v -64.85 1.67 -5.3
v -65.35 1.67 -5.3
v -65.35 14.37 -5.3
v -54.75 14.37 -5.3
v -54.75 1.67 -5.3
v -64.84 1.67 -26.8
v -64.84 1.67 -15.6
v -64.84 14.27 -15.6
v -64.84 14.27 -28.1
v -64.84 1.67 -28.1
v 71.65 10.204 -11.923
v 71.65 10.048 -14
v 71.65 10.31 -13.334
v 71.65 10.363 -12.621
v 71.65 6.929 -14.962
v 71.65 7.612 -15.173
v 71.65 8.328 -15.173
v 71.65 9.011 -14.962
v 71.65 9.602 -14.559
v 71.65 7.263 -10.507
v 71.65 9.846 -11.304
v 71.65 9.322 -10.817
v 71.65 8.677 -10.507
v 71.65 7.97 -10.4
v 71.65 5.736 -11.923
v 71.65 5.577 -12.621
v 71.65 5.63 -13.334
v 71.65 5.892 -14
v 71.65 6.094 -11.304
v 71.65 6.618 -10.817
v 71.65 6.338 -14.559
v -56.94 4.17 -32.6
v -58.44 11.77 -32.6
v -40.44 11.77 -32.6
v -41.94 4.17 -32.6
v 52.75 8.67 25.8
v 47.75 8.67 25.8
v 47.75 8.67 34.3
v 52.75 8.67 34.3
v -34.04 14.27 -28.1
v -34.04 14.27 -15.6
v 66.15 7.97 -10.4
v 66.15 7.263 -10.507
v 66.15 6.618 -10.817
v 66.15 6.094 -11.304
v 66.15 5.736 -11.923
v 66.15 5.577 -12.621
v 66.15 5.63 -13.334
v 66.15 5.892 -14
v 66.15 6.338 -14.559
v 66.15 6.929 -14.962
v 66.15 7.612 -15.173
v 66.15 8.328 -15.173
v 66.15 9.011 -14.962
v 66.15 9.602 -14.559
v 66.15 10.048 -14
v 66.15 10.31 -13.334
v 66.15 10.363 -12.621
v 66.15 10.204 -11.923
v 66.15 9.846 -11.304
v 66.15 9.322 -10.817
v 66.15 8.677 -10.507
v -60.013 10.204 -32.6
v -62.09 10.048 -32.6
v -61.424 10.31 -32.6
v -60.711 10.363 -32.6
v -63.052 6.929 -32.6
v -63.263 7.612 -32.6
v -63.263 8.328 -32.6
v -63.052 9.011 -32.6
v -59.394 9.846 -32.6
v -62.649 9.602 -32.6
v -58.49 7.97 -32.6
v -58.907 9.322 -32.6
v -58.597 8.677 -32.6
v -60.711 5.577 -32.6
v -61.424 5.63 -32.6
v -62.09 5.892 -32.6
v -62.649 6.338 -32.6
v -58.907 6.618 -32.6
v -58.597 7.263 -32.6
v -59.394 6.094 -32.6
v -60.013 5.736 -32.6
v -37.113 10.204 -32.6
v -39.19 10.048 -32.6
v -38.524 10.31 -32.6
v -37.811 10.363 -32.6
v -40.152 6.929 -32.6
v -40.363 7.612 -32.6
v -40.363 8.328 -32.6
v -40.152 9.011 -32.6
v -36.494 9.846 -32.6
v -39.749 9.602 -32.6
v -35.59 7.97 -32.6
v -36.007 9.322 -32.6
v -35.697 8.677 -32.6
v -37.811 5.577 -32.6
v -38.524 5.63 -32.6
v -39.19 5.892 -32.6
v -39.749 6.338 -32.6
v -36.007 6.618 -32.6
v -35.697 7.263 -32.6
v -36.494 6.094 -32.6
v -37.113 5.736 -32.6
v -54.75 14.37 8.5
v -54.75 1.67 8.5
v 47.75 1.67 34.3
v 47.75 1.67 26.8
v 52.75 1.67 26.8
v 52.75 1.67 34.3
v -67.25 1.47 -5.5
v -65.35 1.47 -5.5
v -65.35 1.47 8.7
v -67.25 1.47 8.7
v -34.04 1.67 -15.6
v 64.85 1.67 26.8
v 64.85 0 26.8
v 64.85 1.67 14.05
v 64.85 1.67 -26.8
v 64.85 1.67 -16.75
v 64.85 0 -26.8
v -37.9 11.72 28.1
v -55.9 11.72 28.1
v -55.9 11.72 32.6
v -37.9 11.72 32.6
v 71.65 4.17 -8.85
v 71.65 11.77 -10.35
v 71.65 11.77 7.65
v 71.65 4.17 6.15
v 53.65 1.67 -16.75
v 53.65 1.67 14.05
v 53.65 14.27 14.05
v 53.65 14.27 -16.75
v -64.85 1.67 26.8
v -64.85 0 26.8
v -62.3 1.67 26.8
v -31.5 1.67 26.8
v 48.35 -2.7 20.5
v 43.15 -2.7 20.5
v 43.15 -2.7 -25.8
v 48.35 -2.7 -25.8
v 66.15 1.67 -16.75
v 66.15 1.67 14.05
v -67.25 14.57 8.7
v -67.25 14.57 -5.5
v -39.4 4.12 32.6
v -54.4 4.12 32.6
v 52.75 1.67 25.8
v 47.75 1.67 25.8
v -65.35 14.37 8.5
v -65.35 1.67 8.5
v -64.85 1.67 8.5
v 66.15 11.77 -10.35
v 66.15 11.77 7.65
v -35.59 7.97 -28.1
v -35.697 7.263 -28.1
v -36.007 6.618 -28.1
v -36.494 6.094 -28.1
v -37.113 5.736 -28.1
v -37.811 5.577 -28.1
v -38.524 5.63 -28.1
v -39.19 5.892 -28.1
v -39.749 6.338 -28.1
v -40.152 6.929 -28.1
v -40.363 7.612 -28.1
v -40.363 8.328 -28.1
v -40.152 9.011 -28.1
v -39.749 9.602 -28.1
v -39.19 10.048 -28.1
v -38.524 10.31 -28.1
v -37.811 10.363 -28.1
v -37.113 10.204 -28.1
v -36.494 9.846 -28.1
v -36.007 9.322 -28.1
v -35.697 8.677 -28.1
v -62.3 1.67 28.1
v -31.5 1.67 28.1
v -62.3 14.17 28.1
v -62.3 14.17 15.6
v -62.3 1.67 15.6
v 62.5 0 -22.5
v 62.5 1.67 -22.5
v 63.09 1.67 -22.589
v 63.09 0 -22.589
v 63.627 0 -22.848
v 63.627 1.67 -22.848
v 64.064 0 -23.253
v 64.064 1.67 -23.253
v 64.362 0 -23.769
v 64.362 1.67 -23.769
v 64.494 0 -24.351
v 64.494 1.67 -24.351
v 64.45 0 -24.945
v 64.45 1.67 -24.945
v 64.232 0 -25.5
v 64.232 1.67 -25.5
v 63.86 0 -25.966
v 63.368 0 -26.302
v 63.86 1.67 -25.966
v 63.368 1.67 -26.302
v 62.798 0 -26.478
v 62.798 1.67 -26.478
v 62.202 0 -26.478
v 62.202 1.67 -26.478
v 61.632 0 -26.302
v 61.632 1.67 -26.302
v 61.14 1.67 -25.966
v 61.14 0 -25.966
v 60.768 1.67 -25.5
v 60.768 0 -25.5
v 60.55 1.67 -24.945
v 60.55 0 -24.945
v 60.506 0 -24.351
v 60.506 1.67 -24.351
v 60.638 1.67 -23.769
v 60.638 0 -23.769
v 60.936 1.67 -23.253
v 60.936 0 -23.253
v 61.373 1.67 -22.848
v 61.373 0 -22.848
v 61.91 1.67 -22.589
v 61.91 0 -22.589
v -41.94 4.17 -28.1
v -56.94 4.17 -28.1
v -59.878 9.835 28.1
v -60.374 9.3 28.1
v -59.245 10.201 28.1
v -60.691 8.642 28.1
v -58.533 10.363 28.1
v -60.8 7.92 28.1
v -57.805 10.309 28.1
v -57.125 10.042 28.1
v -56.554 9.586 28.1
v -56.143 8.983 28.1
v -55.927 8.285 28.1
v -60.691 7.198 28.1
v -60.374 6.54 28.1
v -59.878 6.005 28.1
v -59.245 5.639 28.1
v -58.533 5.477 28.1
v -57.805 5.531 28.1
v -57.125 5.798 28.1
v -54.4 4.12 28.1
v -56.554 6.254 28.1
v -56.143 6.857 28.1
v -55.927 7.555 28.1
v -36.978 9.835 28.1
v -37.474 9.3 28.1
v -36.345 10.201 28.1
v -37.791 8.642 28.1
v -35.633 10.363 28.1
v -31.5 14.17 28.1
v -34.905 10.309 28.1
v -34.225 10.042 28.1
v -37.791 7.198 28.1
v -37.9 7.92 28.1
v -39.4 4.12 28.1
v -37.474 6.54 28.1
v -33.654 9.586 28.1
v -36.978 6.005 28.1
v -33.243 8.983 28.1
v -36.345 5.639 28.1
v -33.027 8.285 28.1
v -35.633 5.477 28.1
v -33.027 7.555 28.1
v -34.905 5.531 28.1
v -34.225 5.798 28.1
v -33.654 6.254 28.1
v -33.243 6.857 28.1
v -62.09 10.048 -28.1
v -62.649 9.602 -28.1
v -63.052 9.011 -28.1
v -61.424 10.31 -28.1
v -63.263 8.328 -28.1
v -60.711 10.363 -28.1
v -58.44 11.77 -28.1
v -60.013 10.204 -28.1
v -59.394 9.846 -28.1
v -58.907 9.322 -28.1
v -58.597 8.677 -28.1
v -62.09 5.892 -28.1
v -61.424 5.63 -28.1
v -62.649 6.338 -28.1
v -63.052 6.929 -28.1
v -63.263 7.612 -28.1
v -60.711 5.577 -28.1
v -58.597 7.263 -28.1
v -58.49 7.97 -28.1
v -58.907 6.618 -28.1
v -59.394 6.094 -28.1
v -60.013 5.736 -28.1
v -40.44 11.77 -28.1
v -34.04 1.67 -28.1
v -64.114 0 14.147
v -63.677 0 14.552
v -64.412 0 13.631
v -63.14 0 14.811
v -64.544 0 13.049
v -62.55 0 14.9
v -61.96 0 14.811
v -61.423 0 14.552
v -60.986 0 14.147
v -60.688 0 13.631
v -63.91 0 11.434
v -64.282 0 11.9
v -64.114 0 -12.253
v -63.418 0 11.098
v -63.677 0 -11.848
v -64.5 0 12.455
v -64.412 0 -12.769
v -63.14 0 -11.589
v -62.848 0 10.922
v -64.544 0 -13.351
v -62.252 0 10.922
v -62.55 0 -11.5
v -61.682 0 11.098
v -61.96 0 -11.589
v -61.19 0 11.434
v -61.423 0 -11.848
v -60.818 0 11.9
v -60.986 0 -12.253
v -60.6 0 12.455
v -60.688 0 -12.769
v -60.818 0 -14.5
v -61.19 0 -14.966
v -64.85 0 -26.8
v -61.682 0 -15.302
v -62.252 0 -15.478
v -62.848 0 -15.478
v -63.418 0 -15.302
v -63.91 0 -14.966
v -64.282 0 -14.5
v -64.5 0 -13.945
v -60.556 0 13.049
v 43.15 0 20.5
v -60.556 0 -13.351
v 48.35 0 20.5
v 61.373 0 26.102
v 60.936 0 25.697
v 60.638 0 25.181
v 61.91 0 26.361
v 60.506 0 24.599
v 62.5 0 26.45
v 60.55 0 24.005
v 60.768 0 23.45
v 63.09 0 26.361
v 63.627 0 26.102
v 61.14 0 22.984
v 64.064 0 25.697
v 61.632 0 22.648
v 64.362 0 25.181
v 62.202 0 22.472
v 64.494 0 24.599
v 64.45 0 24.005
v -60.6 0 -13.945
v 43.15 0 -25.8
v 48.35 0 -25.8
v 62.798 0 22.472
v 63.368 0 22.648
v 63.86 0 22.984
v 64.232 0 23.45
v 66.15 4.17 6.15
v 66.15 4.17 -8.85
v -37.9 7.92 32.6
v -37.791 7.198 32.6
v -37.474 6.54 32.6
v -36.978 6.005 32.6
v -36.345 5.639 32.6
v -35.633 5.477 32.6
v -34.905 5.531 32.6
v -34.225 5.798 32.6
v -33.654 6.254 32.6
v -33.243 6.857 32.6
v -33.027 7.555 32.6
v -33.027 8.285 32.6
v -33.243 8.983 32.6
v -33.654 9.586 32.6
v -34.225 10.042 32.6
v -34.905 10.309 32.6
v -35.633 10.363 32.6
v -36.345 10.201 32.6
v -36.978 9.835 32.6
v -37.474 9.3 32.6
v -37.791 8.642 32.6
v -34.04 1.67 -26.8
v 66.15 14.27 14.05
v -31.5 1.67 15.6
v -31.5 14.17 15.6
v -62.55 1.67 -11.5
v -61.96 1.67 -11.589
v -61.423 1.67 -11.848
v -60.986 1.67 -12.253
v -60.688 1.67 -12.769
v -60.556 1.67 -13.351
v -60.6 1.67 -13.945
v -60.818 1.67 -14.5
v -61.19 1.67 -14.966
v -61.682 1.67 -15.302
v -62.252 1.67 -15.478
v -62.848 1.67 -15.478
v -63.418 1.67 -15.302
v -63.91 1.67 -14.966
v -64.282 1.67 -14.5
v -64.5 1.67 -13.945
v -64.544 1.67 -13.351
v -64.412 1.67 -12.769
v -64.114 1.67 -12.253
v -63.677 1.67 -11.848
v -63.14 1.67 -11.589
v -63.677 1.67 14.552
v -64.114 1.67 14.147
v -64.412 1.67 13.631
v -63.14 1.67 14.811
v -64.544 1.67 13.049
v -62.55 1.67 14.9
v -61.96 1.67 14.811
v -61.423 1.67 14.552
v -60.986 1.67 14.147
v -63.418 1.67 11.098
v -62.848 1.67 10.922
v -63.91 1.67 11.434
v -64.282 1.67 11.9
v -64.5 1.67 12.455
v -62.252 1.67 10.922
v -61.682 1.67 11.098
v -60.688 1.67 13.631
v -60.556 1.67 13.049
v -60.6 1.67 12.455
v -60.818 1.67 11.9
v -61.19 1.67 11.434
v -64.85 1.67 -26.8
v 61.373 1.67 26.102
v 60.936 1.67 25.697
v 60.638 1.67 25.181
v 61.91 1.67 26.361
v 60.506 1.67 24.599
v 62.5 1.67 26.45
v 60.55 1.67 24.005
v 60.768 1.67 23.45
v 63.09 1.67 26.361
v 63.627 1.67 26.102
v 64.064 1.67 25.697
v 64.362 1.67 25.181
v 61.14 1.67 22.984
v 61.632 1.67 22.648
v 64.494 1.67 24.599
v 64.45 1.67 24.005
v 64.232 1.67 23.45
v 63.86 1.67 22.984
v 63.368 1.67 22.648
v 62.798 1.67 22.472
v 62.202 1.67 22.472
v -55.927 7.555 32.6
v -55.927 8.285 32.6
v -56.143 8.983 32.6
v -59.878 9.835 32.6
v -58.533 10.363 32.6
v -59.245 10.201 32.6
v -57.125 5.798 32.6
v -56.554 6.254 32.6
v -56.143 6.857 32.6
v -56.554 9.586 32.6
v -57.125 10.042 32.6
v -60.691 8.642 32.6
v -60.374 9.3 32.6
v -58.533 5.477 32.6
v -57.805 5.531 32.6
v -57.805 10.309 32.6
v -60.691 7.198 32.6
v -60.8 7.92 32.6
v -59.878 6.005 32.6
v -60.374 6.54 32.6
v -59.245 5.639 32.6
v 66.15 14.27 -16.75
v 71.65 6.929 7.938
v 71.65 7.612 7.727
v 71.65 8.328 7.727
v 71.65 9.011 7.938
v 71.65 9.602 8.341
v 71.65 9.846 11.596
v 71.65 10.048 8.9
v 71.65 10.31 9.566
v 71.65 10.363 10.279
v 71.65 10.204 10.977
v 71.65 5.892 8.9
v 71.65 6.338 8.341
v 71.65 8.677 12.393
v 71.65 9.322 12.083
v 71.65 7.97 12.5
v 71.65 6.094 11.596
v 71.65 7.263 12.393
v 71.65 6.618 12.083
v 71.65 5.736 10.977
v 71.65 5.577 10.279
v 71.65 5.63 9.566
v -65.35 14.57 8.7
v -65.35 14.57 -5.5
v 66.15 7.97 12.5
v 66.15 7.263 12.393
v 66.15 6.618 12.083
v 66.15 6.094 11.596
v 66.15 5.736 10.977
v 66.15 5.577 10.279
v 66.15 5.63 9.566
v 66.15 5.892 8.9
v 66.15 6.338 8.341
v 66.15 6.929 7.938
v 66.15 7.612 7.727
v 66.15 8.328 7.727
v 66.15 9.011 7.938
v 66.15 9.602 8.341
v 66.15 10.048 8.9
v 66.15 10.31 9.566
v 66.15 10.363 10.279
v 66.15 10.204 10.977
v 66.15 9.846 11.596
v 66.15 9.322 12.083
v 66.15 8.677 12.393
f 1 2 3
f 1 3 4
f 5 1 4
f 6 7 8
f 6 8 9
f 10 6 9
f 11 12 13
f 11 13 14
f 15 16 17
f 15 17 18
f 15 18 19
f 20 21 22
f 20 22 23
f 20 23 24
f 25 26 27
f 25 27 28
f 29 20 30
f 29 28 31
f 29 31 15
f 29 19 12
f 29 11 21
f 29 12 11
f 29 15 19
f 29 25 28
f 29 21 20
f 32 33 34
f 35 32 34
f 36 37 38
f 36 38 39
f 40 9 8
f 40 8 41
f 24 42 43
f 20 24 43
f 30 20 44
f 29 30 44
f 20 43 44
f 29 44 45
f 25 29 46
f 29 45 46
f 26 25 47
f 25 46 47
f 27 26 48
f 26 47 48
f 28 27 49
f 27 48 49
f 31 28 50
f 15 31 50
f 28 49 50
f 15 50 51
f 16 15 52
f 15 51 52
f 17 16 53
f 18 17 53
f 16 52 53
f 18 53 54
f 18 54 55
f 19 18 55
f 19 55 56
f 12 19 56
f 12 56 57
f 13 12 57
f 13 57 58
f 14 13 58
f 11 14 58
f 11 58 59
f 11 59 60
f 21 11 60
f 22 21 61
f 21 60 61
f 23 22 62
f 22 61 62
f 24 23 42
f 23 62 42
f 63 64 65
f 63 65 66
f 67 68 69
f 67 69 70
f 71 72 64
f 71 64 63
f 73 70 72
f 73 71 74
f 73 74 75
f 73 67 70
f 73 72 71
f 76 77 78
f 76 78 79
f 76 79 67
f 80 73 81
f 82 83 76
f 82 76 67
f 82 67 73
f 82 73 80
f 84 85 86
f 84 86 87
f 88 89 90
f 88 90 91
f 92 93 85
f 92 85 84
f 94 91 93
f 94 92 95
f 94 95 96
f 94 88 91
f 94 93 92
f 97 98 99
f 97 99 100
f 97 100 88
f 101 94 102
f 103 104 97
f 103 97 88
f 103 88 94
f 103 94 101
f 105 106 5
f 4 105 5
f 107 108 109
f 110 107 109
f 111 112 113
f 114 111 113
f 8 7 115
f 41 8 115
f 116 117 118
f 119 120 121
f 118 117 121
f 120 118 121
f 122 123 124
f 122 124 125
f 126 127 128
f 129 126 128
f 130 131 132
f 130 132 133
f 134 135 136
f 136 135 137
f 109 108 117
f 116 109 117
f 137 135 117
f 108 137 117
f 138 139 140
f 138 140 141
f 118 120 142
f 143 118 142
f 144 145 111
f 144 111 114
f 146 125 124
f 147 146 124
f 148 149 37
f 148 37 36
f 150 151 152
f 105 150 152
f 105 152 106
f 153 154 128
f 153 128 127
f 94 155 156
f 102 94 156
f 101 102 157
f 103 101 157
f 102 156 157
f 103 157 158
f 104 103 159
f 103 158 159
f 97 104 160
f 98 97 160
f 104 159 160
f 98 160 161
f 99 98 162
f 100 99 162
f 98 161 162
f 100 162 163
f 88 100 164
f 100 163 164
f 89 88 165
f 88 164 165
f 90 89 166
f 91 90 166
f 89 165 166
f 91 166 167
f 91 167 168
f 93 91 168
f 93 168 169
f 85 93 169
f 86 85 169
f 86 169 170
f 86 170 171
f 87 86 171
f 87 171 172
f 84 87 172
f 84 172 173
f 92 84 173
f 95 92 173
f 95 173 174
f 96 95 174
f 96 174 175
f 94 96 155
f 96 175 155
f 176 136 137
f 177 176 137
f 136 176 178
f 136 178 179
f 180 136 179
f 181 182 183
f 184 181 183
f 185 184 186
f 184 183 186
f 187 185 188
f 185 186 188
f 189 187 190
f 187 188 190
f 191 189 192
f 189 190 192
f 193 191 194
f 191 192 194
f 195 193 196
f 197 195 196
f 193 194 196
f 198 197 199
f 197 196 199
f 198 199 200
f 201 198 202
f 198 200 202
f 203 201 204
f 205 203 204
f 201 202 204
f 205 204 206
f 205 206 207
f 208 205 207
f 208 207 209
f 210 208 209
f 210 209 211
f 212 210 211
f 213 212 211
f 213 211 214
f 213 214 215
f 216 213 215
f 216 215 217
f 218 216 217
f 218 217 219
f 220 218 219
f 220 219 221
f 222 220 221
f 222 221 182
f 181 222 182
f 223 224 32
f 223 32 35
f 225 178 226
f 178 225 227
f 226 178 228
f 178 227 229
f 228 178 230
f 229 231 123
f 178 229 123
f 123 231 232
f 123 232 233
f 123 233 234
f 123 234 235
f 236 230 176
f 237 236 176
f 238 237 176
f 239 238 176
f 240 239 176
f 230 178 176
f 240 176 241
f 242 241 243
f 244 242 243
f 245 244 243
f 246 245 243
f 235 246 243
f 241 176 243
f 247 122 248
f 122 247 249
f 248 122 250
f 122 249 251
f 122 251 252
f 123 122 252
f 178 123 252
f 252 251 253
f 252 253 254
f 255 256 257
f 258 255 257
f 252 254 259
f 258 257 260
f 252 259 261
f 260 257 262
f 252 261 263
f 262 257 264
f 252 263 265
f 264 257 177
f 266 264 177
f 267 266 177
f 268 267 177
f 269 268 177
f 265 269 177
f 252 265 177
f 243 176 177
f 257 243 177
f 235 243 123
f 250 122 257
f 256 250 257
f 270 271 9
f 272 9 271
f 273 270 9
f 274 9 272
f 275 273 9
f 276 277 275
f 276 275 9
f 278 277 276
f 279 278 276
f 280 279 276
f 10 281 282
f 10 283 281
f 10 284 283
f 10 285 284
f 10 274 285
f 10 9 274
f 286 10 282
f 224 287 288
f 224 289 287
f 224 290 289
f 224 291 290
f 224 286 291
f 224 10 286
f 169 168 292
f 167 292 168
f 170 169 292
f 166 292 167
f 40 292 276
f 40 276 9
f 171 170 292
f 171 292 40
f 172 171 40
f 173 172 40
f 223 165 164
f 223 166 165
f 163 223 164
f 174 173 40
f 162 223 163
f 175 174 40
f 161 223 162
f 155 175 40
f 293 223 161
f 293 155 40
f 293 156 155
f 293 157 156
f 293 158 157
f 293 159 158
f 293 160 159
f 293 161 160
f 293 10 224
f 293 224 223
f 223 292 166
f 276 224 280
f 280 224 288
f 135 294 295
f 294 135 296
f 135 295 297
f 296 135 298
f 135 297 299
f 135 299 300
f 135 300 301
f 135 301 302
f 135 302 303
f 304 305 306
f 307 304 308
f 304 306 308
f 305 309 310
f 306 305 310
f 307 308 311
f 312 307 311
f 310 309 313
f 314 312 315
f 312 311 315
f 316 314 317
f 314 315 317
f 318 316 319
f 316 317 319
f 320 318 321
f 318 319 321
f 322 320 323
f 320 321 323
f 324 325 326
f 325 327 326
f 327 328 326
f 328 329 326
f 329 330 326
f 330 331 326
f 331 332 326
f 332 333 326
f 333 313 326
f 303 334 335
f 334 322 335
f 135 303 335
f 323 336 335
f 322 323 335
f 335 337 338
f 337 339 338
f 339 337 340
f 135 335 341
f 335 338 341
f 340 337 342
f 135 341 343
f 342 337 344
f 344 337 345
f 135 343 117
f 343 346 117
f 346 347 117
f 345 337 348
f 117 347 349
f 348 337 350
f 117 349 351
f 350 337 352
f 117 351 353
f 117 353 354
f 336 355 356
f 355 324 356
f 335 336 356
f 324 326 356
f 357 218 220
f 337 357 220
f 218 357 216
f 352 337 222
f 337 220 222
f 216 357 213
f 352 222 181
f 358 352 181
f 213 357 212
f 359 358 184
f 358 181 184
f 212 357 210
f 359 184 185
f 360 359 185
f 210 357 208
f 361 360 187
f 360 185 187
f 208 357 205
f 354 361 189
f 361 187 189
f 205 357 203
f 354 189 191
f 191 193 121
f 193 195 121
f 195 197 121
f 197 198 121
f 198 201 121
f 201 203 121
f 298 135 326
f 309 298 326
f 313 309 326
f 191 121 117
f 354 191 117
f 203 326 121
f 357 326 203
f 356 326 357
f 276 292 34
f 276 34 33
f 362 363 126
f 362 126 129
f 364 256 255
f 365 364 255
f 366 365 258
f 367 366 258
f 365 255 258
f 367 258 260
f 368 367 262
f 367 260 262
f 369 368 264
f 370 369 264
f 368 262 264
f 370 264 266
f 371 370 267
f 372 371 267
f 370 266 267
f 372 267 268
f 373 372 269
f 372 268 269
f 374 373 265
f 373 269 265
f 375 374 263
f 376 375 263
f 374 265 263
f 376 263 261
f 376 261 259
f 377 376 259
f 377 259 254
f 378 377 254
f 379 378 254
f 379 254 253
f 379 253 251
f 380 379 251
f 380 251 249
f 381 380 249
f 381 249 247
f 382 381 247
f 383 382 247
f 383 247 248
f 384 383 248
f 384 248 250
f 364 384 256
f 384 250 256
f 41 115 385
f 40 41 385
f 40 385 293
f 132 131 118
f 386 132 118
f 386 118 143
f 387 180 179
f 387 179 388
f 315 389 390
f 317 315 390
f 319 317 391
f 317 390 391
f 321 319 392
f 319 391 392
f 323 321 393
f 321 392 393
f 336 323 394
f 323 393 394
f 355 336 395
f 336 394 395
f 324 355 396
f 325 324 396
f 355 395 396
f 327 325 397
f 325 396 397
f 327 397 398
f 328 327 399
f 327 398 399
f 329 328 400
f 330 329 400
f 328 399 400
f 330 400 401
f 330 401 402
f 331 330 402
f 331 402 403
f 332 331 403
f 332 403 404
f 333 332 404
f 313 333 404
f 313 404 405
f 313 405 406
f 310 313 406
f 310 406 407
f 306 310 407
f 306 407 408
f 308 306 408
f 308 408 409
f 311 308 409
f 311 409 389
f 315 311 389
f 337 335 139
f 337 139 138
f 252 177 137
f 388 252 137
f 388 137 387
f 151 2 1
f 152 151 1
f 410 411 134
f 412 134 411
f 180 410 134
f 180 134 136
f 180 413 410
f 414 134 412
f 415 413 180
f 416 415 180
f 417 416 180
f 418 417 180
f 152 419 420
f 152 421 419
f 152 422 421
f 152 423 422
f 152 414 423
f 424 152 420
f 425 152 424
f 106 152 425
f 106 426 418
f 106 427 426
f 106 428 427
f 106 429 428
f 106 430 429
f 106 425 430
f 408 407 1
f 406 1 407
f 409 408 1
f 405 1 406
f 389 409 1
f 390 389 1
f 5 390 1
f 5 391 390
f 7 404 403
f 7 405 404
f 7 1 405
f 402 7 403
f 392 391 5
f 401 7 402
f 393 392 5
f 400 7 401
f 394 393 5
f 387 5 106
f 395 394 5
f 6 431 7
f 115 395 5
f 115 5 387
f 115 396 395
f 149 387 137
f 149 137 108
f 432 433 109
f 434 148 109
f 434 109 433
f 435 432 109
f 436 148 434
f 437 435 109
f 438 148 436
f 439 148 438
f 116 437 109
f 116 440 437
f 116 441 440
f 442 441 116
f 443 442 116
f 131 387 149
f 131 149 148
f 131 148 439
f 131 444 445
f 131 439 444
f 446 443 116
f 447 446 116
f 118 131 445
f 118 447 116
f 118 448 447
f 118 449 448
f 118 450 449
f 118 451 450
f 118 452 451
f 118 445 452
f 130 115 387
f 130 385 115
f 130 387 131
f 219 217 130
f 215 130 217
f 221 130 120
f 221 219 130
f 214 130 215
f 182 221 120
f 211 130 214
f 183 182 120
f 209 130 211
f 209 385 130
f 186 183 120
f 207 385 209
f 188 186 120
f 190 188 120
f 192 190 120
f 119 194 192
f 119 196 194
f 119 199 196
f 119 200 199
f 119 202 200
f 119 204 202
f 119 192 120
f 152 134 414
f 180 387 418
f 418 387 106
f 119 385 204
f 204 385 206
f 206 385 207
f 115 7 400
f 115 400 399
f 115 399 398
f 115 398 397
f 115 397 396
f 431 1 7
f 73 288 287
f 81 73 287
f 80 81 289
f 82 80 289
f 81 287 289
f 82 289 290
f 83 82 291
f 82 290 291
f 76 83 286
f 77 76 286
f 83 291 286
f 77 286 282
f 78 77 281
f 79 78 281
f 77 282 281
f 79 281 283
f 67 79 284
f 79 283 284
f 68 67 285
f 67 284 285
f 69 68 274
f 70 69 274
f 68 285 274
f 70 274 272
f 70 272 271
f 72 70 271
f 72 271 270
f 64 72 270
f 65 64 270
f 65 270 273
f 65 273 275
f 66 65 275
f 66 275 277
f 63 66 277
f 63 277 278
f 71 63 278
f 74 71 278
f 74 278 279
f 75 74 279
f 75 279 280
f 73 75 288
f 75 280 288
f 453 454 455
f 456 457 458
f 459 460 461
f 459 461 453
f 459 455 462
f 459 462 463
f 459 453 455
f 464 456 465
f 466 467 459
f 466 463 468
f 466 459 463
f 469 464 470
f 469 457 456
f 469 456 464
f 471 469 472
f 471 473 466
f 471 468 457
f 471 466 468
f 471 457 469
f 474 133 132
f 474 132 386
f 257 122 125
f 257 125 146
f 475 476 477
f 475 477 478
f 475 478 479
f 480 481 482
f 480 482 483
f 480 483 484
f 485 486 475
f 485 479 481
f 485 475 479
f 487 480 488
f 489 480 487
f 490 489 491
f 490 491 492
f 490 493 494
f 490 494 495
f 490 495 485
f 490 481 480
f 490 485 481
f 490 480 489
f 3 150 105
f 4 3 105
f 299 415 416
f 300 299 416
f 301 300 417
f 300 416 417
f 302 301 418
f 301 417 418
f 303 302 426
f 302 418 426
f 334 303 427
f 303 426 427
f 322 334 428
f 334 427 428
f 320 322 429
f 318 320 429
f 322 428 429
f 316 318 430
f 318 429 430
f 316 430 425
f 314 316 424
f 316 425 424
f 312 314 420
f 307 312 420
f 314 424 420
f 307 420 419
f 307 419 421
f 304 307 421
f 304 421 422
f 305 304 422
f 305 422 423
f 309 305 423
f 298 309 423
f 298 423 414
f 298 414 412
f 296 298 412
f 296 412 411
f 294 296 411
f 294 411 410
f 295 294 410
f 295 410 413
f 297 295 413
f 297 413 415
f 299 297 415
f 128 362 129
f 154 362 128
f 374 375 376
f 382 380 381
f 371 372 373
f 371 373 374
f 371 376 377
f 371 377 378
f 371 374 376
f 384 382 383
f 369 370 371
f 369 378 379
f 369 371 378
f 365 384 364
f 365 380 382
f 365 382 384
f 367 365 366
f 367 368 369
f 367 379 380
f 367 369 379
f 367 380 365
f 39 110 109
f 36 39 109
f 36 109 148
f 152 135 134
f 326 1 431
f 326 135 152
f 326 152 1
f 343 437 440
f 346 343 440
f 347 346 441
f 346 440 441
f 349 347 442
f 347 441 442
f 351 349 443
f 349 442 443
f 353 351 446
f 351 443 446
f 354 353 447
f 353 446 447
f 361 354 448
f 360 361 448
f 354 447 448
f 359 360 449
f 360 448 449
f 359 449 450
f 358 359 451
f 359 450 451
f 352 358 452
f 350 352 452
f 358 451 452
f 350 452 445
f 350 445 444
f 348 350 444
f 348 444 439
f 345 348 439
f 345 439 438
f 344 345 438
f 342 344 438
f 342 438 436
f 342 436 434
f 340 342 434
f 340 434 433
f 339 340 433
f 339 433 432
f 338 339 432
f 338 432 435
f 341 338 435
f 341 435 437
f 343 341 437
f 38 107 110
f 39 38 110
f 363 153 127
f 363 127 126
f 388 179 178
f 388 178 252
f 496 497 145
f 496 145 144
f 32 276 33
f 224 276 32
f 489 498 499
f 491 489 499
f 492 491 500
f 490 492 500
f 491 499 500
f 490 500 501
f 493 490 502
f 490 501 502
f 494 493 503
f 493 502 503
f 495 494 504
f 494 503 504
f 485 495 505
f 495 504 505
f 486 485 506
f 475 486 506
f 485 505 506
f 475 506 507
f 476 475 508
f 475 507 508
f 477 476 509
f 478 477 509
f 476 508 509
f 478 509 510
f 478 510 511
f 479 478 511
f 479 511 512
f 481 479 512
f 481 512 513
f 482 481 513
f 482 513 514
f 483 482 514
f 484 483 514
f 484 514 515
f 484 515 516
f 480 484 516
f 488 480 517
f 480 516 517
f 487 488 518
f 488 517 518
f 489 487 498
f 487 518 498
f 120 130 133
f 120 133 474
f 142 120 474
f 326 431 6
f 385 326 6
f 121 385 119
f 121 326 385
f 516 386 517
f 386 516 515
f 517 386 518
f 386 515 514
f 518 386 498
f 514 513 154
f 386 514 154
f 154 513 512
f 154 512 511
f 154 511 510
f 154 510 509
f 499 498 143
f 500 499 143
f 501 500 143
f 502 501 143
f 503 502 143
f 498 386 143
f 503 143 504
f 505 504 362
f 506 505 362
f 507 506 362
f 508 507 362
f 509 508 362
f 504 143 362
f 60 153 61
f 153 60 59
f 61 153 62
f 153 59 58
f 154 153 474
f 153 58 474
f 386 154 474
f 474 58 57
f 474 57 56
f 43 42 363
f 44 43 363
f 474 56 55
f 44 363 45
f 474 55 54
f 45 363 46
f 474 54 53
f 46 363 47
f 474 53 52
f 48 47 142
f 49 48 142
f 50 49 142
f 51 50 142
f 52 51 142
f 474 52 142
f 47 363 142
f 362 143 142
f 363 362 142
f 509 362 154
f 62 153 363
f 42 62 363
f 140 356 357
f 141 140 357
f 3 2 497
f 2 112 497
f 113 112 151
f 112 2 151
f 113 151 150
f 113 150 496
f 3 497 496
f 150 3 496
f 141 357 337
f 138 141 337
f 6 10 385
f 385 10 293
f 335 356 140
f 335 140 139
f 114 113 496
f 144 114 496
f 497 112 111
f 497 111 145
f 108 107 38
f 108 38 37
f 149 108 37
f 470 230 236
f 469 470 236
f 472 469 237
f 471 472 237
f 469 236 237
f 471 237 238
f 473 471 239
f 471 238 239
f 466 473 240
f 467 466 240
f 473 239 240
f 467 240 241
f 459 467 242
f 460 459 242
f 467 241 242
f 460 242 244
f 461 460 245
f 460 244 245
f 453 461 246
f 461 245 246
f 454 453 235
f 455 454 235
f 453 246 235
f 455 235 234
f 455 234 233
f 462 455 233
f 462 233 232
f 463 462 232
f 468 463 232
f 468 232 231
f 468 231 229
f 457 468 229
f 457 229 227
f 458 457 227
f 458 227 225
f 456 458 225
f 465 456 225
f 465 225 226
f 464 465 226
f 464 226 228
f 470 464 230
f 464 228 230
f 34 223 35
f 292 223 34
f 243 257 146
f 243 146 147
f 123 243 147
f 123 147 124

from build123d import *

# Parameters (mm, degrees)
SKETCH1_W           = 129.7
SKETCH1_H           = 53.6
BOARDBASE_DEPTH     = 1.67
SKETCH3_W           = 12.5
SKETCH3_H           = 30.8
BOSS_EXTRUDE2_DEPTH = 12.6
SKETCH4_R           = 2.4
BOSS_EXTRUDE3_DEPTH = 5.5
SKETCH6_W           = 30.8
SKETCH6_H           = 12.5
BOSS_EXTRUDE5_DEPTH = 12.5
SKETCH7_R           = 2.45
BOSS_EXTRUDE6_DEPTH = 4.5
SKETCH5_W           = 30.8
SKETCH5_H           = 12.5
BOSS_EXTRUDE4_DEPTH = 12.6
SKETCH9_R           = 2.4
BOSS_EXTRUDE7_DEPTH = 4.5
SKETCH10_W          = 10.6
SKETCH10_H          = 13.8
BOSS_EXTRUDE8_DEPTH = 12.7
SKETCH12_W          = 14.2
SKETCH12_H          = 13.1
BOSS_EXTRUDE9_DEPTH = 1.9
SKETCH13_W          = 5.2
SKETCH13_H          = 46.3
MOLEXHEADER_DEPTH   = 2.7
SKETCH14_R          = 2
MOUNTHOLES_DEPTH    = 80.767740973
SKETCH15_W          = 5
SKETCH15_H          = 8.5
STIMHEADER_DEPTH    = 7


with BuildPart() as part:
    # Sketch1 → BoardBase (new body)
    with BuildSketch(Plane(origin=(0, 0, 0), x_dir=(1, 0, 0), z_dir=(0, 1, 0))):
        Rectangle(SKETCH1_W, SKETCH1_H)
    extrude(amount=BOARDBASE_DEPTH)

    # Sketch3 → Boss-Extrude2 (add)
    with BuildSketch(Plane(origin=(0, 1.67, 0), x_dir=(1, 0, 0), z_dir=(0, 1, 0))):
        with Locations((59.9, 1.35)):
            Rectangle(SKETCH3_W, SKETCH3_H)
    extrude(amount=BOSS_EXTRUDE2_DEPTH)

    # Sketch4 → Boss-Extrude3 (add)
    with BuildSketch(Plane(origin=(66.15, 0, 0), x_dir=(0, 0, -1), z_dir=(1, 0, 0))):
        with Locations(Location((-10.1, 7.97, 0), (0, 0, 180))):
            Circle(SKETCH4_R)
        with Locations(Location((12.8, 7.97, 0), (0, 0, 180))):
            Circle(SKETCH4_R)
        Polygon((-7.65, 11.77), (10.35, 11.77), (8.85, 4.17), (-6.15, 4.17), align=None)
    extrude(amount=BOSS_EXTRUDE3_DEPTH)

    # Sketch6 → Boss-Extrude5 (add)
    with BuildSketch(Plane(origin=(0, 1.67, 0), x_dir=(1, 0, 0), z_dir=(0, 1, 0))):
        with Locations((-46.9, -21.85)):
            Rectangle(SKETCH6_W, SKETCH6_H)
    extrude(amount=BOSS_EXTRUDE5_DEPTH)

    # Sketch7 → Boss-Extrude6 (add)
    with BuildSketch(Plane.XY.offset(28.1)):
        with Locations(Location((-58.35, 7.92, 0), (0, 0, 180))):
            Circle(SKETCH7_R)
        with Locations(Location((-35.45, 7.92, 0), (0, 0, 180))):
            Circle(SKETCH7_R)
        Polygon((-55.9, 11.72), (-37.9, 11.72), (-39.4, 4.12), (-54.4, 4.12), align=None)
    extrude(amount=BOSS_EXTRUDE6_DEPTH)

    # Sketch5 → Boss-Extrude4 (add)
    with BuildSketch(Plane(origin=(0, 1.67, 0), x_dir=(1, 0, 0), z_dir=(0, 1, 0))):
        with Locations((-49.44, 21.85)):
            Rectangle(SKETCH5_W, SKETCH5_H)
    extrude(amount=BOSS_EXTRUDE4_DEPTH)

    # Sketch9 → Boss-Extrude7 (add)
    with BuildSketch(Plane(origin=(0, 0, -28.1), x_dir=(-1, 0, 0), z_dir=(0, 0, -1))):
        with Locations(Location((37.99, 7.97, 0), (0, 0, 180))):
            Circle(SKETCH9_R)
        with Locations(Location((60.89, 7.97, 0), (0, 0, 180))):
            Circle(SKETCH9_R)
        Polygon((40.44, 11.77), (58.44, 11.77), (56.94, 4.17), (41.94, 4.17), align=None)
    extrude(amount=BOSS_EXTRUDE7_DEPTH)

    # Sketch10 → Boss-Extrude8 (add)
    with BuildSketch(Plane(origin=(0, 1.67, 0), x_dir=(1, 0, 0), z_dir=(0, 1, 0))):
        with Locations((-60.05, -1.6)):
            Rectangle(SKETCH10_W, SKETCH10_H)
    extrude(amount=BOSS_EXTRUDE8_DEPTH)

    # Sketch12 → Boss-Extrude9 (add)
    with BuildSketch(Plane.ZY.offset(65.35)):
        with Locations((1.6, 8.02)):
            Rectangle(SKETCH12_W, SKETCH12_H)
    extrude(amount=BOSS_EXTRUDE9_DEPTH)

    # Sketch13 → MolexHeader (add)
    with BuildSketch(Plane.XZ):
        with Locations((45.75, -2.65)):
            Rectangle(SKETCH13_W, SKETCH13_H)
    extrude(amount=MOLEXHEADER_DEPTH)

    # Sketch14 → MountHoles (cut, through all)
    with BuildSketch(Plane(origin=(0, 1.67, 0), x_dir=(1, 0, 0), z_dir=(0, 1, 0))):
        with Locations(Location((62.5, 24.5, 0), (0, 0, 270))):
            Circle(SKETCH14_R)
        with Locations(Location((62.5, -24.45, 0), (0, 0, 270))):
            Circle(SKETCH14_R)
        with Locations(Location((-62.55, -12.9, 0), (0, 0, 270))):
            Circle(SKETCH14_R)
        with Locations(Location((-62.55, 13.5, 0), (0, 0, 270))):
            Circle(SKETCH14_R)
    extrude(amount=-MOUNTHOLES_DEPTH, mode=Mode.SUBTRACT)

    # Sketch15 → StimHeader (add)
    with BuildSketch(Plane(origin=(0, 1.67, 0), x_dir=(1, 0, 0), z_dir=(0, 1, 0))):
        with Locations((50.25, -30.05)):
            Rectangle(SKETCH15_W, SKETCH15_H)
    extrude(amount=STIMHEADER_DEPTH)


solid = part.part
